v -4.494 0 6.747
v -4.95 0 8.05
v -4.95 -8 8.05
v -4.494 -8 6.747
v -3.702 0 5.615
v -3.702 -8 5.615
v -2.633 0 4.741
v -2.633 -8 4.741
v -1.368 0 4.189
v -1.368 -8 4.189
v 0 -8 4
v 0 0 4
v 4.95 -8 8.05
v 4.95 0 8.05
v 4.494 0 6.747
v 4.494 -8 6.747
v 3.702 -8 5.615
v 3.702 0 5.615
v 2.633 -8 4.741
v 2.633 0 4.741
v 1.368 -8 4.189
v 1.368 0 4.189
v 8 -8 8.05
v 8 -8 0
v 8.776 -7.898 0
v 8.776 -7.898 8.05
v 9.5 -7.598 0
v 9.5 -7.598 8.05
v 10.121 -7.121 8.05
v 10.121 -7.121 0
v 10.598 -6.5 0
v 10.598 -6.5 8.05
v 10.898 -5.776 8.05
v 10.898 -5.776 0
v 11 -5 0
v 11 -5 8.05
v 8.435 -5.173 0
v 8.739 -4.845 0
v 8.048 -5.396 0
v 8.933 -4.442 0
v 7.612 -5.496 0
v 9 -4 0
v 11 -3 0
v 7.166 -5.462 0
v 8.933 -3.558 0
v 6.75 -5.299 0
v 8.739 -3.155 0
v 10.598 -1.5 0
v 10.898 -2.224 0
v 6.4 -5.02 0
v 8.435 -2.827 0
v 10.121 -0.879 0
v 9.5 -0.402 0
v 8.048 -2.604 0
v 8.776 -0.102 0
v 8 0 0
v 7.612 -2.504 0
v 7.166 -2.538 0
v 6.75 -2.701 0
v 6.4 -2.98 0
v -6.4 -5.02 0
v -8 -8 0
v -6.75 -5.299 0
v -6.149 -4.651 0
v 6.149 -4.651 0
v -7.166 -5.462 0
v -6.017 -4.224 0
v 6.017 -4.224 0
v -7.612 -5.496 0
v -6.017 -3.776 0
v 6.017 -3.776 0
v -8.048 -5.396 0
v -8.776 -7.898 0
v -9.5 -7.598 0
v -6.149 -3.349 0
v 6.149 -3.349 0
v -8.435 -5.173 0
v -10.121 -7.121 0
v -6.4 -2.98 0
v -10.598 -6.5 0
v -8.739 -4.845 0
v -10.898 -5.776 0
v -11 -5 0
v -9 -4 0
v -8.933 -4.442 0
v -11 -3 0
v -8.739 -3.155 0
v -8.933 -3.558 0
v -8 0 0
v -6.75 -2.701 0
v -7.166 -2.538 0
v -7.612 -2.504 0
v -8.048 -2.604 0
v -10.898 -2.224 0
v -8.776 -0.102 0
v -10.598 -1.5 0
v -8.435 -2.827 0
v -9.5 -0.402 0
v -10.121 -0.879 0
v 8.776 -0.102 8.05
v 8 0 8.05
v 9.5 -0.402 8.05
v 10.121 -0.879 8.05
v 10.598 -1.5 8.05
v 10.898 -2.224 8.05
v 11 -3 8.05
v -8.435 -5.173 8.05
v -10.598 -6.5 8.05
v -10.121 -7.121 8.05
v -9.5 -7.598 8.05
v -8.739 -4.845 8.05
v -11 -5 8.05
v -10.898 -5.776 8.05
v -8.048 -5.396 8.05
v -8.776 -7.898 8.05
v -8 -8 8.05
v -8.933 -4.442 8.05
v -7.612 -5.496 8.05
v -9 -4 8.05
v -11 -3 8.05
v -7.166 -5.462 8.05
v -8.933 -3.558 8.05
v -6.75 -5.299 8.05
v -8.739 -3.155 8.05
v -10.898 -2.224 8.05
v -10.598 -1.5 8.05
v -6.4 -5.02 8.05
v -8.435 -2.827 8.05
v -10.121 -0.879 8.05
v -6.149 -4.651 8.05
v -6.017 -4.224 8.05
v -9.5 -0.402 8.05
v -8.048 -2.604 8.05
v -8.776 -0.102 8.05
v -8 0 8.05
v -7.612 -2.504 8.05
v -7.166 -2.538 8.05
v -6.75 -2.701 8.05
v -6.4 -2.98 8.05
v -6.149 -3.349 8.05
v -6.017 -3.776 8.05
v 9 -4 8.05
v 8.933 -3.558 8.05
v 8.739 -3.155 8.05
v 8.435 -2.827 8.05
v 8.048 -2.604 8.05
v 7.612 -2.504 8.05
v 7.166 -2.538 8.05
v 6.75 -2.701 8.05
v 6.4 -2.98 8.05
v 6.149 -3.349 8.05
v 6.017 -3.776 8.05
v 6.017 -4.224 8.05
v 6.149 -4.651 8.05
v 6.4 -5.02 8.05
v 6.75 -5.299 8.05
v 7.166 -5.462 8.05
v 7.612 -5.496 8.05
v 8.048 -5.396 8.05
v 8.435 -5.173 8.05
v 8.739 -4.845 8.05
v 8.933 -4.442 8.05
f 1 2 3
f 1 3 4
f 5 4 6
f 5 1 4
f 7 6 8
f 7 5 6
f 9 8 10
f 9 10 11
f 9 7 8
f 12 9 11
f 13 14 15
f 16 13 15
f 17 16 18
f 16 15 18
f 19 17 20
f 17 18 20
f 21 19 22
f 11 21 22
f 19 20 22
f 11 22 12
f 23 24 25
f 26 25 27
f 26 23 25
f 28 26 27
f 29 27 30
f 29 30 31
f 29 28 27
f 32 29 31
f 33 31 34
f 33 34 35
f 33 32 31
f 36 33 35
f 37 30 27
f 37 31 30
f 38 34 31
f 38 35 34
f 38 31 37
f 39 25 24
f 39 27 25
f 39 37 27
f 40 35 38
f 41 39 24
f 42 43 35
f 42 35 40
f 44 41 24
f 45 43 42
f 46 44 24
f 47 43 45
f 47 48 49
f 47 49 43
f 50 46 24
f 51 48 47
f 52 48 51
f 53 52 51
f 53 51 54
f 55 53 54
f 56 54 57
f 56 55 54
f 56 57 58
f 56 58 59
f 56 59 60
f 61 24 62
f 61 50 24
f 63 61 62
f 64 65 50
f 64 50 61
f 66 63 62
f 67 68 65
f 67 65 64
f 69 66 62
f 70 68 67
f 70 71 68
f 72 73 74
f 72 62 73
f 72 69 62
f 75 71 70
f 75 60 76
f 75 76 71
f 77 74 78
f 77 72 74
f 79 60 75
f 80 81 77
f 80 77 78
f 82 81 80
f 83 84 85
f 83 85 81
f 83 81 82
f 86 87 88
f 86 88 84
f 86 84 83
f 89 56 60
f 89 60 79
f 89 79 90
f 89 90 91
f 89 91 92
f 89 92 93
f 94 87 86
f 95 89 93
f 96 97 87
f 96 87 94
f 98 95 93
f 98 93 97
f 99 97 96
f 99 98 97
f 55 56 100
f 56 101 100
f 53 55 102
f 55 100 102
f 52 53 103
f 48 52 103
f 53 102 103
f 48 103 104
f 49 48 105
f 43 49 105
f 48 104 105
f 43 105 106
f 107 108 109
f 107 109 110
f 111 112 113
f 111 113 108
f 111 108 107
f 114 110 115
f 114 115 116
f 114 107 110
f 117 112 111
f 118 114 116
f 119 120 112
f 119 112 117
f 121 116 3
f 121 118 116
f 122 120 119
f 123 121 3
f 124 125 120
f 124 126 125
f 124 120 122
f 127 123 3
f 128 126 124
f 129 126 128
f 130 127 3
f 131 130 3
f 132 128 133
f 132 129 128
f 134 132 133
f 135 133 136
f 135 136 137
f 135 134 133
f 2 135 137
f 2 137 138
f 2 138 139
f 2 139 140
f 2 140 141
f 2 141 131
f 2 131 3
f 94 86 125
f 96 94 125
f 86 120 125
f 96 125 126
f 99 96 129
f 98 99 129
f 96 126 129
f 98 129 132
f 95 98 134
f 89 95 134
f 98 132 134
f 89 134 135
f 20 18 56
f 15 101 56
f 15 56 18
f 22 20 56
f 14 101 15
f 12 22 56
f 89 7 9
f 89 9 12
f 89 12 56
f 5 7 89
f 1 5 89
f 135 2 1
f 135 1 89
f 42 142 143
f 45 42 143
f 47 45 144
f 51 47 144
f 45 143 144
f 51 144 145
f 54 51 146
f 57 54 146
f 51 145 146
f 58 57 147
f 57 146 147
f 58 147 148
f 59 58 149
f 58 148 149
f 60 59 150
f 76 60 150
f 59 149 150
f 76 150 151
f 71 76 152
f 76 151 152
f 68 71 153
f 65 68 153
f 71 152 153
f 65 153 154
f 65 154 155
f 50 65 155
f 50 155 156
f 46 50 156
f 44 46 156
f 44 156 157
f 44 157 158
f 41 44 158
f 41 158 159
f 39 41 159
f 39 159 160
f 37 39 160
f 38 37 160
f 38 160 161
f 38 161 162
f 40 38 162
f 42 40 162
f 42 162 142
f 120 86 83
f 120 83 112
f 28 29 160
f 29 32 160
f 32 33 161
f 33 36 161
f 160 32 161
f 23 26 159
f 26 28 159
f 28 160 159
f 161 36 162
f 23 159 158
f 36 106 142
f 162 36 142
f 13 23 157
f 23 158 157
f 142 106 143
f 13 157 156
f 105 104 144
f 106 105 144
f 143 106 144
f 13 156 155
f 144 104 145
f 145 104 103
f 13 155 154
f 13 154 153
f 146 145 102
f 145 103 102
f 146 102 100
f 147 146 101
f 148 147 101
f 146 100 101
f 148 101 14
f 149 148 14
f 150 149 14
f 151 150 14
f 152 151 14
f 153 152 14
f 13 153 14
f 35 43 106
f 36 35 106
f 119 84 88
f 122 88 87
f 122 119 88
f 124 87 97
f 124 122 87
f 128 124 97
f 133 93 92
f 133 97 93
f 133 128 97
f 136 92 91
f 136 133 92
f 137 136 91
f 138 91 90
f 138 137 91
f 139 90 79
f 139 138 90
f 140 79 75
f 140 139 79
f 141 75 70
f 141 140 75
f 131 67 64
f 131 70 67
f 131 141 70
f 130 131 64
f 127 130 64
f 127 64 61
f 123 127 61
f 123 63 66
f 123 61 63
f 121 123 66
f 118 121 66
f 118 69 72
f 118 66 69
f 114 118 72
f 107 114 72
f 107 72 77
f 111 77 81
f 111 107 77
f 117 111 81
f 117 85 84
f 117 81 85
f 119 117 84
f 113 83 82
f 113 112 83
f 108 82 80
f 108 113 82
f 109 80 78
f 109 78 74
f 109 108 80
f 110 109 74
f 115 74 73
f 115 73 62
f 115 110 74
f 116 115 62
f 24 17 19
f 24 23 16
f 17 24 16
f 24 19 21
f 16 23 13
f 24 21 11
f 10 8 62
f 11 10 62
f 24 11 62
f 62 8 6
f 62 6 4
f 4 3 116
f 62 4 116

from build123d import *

# Parameters (mm, degrees)
F1_DEPTH = 8
F2_R     = 1.5
F3_DEPTH = 25
F4_R     = 3


# Not quite as in the source:
# - a pattern or mirror of a feature is missing from the dataset's text; its kind, count and spacing are read off the source's solid


with BuildPart() as f1:
    # F0 (on Front) → F1 (new body)
    with BuildSketch(Plane.XZ):
        with BuildLine():
            Line((11, 0), (11, 8.05))
            Line((11, 8.05), (4.95, 8.05))
            ThreePointArc((4.95, 8.05), (3.1978508408, 5.141515639), (0, 4))
            Line((0, 4), (0, 0))
            Line((0, 0), (11, 0))
        make_face()
    extrude(amount=F1_DEPTH)

    # F1_copies: F1 across plane


with BuildPart() as f1_1:
    add(f1.part)
    add(f1.part.mirror(Plane(origin=(0, 0, 0), x_dir=(0, 0, -1), z_dir=(-1, 0, 0))))

    # F2 (on face) → F3 (cut)
    with BuildSketch(Plane.XY.offset(8.05)):
        with Locations((7.5, -4)):
            Circle(F2_R)
    f3 = extrude(amount=-F3_DEPTH, mode=Mode.SUBTRACT)

    # F3_copies: F3 across plane
    add(f3.mirror(Plane(origin=(0, 0, 0), x_dir=(0, 0, -1), z_dir=(-1, 0, 0))), mode=Mode.SUBTRACT)

    # F4
    f4_edges = [f1_1.edges().sort_by_distance(p)[0] for p in [
        (11, 0, 4.025),
        (11, -8, 4.025),
        (-11, 0, 4.025),
        (-11, -8, 4.025),
    ]]
    fillet(f4_edges, radius=F4_R)


solid = f1_1.part
